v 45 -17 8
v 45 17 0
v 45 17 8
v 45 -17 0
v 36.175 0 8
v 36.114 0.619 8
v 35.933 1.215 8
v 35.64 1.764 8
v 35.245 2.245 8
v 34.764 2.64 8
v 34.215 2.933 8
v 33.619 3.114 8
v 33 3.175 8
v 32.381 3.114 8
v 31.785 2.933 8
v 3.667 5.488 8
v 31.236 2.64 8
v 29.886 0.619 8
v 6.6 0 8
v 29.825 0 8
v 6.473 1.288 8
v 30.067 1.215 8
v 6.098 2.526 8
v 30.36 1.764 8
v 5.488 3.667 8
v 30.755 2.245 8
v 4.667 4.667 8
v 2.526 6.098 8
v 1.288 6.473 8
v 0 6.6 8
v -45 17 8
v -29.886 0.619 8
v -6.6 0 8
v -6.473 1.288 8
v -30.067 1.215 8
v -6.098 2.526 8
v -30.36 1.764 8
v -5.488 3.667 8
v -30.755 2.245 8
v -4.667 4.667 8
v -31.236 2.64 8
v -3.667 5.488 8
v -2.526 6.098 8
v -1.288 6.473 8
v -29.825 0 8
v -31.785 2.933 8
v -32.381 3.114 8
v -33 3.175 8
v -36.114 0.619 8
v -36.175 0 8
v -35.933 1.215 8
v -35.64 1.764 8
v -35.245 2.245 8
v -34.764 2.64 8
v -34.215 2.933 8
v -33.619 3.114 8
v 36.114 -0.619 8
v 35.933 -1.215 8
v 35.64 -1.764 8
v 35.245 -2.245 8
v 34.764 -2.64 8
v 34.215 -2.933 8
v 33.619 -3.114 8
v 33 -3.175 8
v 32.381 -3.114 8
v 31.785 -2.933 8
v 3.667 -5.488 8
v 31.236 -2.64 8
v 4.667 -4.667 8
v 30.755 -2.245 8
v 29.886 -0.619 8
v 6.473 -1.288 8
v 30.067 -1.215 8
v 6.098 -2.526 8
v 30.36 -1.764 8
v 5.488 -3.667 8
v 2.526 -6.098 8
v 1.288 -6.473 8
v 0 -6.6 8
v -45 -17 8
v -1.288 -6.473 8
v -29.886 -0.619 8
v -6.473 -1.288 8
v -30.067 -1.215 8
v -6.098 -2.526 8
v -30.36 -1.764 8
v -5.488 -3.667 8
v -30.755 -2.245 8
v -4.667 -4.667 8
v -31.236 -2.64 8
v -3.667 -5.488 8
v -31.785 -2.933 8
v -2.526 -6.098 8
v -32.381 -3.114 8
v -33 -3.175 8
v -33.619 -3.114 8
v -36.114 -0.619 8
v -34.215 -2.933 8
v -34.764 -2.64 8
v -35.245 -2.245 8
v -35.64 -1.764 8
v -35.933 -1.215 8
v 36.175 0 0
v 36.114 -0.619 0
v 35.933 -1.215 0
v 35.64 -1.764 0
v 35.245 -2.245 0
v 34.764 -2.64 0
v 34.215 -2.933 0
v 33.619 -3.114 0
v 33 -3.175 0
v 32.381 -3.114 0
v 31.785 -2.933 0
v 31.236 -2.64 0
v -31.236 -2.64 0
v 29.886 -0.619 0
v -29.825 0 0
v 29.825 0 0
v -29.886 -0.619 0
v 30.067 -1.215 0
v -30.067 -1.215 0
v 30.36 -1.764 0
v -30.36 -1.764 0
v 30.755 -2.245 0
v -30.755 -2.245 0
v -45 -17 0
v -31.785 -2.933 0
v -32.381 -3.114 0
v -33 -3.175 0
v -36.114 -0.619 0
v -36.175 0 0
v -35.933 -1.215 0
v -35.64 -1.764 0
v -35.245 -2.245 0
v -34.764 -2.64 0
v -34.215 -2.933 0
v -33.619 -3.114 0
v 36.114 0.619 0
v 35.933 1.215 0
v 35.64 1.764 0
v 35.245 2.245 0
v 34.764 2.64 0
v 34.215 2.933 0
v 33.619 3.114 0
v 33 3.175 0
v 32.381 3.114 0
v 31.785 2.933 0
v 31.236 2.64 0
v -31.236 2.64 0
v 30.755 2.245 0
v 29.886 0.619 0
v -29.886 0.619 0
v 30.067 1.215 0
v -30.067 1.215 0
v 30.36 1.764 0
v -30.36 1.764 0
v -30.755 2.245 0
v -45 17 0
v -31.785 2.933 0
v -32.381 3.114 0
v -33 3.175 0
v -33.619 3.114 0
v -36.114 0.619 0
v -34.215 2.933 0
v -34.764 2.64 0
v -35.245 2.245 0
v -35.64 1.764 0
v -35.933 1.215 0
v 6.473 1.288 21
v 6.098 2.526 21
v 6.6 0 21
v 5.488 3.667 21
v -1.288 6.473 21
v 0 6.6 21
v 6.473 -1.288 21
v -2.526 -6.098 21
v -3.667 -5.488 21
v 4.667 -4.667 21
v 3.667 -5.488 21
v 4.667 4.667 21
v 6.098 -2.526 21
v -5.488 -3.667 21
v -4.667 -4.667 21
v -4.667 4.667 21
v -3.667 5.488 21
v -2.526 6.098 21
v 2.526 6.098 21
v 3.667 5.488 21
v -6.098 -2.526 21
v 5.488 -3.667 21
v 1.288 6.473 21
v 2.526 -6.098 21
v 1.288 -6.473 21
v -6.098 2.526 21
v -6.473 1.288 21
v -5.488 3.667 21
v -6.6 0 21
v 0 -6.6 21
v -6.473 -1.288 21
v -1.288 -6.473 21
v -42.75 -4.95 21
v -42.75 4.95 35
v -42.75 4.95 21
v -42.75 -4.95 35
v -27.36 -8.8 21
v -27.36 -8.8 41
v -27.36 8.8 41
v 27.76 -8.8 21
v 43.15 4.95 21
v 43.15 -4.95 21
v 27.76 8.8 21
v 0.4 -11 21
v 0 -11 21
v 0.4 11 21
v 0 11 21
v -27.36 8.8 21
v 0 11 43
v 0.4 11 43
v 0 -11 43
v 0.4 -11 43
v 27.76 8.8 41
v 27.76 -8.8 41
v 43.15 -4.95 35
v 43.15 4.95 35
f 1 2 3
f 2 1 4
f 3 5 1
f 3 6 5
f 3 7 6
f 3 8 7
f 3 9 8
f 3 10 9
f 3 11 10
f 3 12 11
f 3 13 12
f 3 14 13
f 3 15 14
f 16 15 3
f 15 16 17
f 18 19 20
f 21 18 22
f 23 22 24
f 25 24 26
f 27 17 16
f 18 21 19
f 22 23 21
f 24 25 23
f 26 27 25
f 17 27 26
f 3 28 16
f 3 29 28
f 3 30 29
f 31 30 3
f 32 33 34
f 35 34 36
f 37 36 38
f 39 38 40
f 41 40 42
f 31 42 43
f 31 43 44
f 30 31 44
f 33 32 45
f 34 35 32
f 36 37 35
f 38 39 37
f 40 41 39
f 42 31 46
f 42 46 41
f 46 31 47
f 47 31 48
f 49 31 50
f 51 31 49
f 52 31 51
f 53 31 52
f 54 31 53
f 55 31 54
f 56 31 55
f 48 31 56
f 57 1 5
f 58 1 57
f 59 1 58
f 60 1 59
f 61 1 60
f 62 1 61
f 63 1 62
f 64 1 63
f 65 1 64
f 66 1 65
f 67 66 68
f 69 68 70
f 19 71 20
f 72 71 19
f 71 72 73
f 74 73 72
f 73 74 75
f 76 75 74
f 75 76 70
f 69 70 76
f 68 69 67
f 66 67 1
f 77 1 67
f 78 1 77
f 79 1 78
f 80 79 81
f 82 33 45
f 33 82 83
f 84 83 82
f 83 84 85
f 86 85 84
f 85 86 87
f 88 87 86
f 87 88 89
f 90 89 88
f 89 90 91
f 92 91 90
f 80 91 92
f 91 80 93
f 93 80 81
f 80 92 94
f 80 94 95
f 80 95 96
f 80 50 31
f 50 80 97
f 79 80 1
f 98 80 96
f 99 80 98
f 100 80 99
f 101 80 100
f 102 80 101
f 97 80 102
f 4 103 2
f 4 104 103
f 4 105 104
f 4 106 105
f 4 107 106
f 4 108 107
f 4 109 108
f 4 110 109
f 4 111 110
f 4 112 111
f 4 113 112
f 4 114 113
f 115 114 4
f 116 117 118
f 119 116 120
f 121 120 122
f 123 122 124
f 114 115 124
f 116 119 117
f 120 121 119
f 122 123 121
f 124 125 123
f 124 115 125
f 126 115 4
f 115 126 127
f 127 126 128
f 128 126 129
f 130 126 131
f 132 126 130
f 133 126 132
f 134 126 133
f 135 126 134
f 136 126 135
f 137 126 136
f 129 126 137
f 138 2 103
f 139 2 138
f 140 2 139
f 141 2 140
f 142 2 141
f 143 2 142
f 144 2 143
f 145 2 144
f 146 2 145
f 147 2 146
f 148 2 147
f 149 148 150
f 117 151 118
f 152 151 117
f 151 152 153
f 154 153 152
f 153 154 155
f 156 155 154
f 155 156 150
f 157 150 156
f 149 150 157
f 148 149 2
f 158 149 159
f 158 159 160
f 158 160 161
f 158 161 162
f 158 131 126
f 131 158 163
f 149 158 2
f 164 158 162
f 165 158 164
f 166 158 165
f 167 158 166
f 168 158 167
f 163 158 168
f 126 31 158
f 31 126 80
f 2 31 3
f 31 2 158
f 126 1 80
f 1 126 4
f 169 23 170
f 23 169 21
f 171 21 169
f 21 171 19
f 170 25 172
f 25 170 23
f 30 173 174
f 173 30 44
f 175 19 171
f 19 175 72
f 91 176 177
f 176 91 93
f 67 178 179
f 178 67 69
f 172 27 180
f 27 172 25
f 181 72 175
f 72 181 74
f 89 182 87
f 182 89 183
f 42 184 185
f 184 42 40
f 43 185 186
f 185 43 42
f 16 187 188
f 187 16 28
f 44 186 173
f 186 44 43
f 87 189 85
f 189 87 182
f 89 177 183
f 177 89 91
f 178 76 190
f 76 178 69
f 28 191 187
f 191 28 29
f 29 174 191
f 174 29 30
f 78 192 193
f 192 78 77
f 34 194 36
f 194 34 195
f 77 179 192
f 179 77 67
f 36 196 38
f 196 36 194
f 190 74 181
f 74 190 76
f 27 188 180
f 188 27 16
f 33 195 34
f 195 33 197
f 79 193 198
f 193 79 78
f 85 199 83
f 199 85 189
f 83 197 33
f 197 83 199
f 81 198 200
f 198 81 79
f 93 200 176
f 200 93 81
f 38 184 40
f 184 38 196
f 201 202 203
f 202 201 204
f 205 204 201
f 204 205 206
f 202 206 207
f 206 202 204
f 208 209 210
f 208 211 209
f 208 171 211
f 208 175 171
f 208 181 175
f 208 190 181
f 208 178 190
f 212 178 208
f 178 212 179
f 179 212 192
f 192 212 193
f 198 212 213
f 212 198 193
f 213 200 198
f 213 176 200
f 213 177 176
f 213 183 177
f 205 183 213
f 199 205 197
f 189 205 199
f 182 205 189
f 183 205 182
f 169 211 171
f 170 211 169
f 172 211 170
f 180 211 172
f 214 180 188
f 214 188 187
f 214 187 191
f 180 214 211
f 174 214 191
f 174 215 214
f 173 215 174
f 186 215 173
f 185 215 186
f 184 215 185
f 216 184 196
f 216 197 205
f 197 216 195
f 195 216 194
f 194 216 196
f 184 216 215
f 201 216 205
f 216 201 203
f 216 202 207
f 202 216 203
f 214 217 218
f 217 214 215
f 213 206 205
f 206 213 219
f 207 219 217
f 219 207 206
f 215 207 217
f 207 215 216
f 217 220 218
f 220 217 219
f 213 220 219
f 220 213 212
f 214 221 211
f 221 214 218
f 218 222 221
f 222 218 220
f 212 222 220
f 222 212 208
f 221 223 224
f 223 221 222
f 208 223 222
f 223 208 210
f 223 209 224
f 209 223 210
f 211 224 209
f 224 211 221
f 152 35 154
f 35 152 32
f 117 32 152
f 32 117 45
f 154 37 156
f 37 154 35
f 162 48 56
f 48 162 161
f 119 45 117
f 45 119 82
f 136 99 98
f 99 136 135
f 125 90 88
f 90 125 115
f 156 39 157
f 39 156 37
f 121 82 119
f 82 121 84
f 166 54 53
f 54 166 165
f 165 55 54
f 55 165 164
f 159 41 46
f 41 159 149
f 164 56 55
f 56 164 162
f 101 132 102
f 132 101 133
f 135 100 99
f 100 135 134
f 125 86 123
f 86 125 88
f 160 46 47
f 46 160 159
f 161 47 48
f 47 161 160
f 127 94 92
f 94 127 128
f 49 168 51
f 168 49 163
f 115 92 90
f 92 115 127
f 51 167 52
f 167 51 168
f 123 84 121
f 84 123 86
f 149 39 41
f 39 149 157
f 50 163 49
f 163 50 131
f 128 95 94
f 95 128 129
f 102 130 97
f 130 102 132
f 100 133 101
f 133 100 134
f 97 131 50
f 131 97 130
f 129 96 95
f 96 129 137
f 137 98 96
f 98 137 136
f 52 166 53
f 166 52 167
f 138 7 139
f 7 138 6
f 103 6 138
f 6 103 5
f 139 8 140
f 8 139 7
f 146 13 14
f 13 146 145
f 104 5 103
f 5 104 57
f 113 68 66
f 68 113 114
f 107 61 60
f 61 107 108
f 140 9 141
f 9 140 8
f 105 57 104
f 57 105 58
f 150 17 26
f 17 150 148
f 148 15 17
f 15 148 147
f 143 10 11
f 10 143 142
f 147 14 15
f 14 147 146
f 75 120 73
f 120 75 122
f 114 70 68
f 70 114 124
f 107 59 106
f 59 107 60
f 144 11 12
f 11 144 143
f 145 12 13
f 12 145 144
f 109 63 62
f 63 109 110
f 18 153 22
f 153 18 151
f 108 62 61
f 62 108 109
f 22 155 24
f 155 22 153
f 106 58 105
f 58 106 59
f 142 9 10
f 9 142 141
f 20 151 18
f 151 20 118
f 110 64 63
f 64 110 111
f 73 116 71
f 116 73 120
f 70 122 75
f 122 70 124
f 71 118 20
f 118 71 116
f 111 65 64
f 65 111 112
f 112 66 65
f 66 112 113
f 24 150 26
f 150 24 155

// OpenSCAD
$fn = 32;

// ----------------------------------------------------------------------
// Boat cleat: 90 mm base, horn 32 mm up
// ----------------------------------------------------------------------

// --- parameters (mm) ---
base_l = 90;              // base length
base_w = 34;              // base width
base_t = 8;               // base thickness
horn_len = 85.5;          // horn length
horn_d = 22;              // horn diameter at the middle
horn_z = 32;              // horn axis height
end_drop = 8;             // how far the horn tips drop
post_d = 13.2;            // centre post diameter
holes_d = 6.35;           // fixing holes
hole_x = 33;              // fixing hole spacing

difference() {
  union() {
    translate([-45, -17, 0]) cube([base_l, base_w, base_t]);
    /* centre post, sunk 1 mm into the base */
    translate([0, 0, 7]) cylinder(h = 25, d = post_d);
    /* horn: a hull chain of boxes, full in the middle and lighter at the tips */
    hull() {
      translate([-42.75, -4.95, 21]) cube([0.4, 9.9, 14], center = false);
      translate([-27.36, -8.8, 21]) cube([0.4, 17.6, 20], center = false);
    }
    hull() {
      translate([-27.36, -8.8, 21]) cube([0.4, 17.6, 20], center = false);
      translate([0, -11, 21]) cube([0.4, 22, 22], center = false);
    }
    hull() {
      translate([0, -11, 21]) cube([0.4, 22, 22], center = false);
      translate([27.36, -8.8, 21]) cube([0.4, 17.6, 20], center = false);
    }
    hull() {
      translate([27.36, -8.8, 21]) cube([0.4, 17.6, 20], center = false);
      translate([42.75, -4.95, 21]) cube([0.4, 9.9, 14], center = false);
    }
  }
  translate([-33, 0, -2.5]) cylinder(h = base_t + 5, d = holes_d);
  translate([33, 0, -2.5]) cylinder(h = base_t + 5, d = holes_d);
}
